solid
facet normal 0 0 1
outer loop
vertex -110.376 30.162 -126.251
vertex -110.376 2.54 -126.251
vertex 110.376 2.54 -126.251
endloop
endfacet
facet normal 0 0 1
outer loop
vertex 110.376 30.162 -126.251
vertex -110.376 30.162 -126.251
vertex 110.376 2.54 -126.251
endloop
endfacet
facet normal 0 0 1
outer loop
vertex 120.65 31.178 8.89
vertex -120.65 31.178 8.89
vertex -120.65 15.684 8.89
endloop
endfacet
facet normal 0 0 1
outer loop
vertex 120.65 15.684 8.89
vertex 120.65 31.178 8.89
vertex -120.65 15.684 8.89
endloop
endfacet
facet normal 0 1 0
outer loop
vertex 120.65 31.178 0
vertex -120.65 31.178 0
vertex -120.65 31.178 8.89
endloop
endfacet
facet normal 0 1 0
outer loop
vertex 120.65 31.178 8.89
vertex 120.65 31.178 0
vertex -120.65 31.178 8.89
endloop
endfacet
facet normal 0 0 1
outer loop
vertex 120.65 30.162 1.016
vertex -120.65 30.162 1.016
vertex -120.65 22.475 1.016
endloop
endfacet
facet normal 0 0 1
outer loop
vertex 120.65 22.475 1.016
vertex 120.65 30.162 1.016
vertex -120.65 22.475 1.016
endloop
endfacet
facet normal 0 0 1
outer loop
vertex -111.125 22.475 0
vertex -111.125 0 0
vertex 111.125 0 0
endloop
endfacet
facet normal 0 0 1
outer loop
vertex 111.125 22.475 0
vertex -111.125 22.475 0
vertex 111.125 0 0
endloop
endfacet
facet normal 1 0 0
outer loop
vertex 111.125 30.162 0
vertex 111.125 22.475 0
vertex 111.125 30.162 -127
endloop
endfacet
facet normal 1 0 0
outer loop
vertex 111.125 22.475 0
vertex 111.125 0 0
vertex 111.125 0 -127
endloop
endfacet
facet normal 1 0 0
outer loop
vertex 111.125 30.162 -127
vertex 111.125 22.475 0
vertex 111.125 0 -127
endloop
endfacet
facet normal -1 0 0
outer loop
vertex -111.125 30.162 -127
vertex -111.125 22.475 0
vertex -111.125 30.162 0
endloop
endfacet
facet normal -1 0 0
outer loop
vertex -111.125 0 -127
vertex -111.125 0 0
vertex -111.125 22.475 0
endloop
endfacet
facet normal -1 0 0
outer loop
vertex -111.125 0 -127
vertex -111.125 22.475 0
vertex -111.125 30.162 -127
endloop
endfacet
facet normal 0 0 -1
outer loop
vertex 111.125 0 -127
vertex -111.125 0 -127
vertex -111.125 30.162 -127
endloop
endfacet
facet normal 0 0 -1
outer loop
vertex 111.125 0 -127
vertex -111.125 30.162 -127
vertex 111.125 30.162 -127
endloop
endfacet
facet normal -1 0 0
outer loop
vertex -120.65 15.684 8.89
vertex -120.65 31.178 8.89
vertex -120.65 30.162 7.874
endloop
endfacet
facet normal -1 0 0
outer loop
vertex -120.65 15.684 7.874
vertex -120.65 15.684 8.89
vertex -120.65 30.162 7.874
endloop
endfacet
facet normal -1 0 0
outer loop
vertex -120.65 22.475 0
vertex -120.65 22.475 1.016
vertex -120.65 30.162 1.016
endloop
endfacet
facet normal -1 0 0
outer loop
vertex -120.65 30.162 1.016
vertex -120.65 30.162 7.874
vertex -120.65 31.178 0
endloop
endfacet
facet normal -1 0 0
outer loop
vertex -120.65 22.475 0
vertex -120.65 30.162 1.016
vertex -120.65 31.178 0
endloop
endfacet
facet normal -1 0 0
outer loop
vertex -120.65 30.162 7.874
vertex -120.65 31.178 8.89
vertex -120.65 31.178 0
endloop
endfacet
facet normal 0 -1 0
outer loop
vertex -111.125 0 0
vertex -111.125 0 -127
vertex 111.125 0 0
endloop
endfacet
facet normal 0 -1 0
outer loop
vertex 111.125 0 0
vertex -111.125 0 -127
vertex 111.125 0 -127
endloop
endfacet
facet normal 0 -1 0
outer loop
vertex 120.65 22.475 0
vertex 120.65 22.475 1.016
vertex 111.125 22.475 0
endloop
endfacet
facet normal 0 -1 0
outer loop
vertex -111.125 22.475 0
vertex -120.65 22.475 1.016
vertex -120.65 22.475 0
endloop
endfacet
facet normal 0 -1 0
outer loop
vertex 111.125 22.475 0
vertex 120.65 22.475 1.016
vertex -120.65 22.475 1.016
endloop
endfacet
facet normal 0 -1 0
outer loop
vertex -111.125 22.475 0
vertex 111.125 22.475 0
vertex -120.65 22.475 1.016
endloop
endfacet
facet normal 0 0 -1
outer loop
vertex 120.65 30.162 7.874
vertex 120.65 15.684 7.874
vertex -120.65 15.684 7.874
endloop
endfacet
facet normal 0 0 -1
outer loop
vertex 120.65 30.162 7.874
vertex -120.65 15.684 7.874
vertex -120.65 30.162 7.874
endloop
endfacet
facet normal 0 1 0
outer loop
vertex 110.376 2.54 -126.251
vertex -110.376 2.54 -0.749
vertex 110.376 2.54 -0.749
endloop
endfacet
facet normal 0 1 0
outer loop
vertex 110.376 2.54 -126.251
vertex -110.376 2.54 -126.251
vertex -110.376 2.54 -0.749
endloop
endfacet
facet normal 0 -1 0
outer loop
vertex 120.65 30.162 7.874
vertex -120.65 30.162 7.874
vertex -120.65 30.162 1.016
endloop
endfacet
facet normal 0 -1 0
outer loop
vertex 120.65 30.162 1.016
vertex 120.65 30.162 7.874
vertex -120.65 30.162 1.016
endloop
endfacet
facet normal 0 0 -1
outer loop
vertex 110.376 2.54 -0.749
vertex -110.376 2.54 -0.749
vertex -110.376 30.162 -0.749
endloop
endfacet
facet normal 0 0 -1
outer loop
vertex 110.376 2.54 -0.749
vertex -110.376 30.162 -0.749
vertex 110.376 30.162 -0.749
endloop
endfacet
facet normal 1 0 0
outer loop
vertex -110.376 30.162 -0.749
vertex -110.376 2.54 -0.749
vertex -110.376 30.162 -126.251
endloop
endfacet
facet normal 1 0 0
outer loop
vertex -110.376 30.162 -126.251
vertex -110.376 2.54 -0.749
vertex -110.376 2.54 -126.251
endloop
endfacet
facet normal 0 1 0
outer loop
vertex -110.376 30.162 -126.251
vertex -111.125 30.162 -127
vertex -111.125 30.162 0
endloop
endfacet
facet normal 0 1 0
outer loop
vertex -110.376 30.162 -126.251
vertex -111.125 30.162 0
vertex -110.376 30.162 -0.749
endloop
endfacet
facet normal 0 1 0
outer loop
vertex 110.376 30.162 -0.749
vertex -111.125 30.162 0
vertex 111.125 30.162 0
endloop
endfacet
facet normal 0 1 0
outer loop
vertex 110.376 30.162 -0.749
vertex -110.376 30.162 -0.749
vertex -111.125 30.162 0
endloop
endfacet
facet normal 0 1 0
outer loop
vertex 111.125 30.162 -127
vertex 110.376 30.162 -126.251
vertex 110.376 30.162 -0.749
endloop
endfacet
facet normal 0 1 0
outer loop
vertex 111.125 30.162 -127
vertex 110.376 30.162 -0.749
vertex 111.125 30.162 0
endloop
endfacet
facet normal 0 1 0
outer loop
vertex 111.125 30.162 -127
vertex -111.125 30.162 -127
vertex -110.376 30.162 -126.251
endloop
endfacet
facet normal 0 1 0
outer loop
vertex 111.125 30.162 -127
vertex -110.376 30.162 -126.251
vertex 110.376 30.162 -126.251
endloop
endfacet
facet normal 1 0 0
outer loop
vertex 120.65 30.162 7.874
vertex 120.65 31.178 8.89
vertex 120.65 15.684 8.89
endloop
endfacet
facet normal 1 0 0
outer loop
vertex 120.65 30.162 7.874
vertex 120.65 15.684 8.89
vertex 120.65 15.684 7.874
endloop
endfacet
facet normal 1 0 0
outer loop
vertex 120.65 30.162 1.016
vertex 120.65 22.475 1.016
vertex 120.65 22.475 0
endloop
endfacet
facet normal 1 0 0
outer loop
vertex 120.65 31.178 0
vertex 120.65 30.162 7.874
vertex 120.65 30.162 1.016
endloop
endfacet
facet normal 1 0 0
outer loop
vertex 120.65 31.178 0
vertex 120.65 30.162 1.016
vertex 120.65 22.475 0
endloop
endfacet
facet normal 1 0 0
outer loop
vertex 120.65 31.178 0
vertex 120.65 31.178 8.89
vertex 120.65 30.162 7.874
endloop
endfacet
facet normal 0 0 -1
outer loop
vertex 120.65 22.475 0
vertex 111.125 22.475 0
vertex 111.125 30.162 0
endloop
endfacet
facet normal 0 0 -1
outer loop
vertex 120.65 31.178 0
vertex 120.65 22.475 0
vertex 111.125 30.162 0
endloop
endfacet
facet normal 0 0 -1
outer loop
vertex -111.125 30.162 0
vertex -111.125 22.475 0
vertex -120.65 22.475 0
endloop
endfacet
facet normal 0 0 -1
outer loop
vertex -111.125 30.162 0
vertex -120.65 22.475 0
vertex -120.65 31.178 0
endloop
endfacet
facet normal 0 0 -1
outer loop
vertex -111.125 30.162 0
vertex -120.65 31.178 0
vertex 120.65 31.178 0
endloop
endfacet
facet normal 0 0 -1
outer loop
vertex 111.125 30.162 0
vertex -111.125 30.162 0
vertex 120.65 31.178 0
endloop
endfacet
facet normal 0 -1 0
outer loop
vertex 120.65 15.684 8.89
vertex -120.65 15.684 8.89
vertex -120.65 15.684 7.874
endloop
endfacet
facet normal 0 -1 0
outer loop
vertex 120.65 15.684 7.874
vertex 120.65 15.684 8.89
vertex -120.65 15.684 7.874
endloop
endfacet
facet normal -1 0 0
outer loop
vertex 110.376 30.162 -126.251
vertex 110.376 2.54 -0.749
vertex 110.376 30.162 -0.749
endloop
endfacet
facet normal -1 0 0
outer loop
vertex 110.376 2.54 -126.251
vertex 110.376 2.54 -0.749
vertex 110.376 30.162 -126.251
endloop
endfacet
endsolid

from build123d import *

# Parameters (mm, degrees)
SKETCH1_W         = 222.25
SKETCH1_H         = 127
BASE_DEPTH        = 2.54
SKETCH1_3_W       = 222.25
SKETCH1_3_H       = 127
SKETCH1_3_W_2     = 220.7514
SKETCH1_3_H_2     = 125.5014
WALLS_DEPTH       = 30.1625
HANDLE_DEPTH      = 120.65
HANDLE_DEPTH_BACK = 120.65


with BuildPart() as part:
    # Sketch1 → Base (new body)
    with BuildSketch(Plane(origin=(0, 0, 0), x_dir=(1, 0, 0), z_dir=(0, 1, 0))):
        with Locations((0, 63.5)):
            Rectangle(SKETCH1_W, SKETCH1_H)
    extrude(amount=BASE_DEPTH)

    # Sketch1<3> → Walls (add)
    with BuildSketch(Plane(origin=(0, 0, 0), x_dir=(1, 0, 0), z_dir=(0, 1, 0))):
        with Locations((0, 63.5)):
            Rectangle(SKETCH1_3_W, SKETCH1_3_H)
        with Locations((0, 63.5)):
            Rectangle(SKETCH1_3_W_2, SKETCH1_3_H_2, mode=Mode.SUBTRACT)
    extrude(amount=WALLS_DEPTH)

    # Sketch2 → Handle (add, two sides: drawn at the far end of the back side and taken through both)
    with BuildSketch(Plane(origin=(0, 0, 0), x_dir=(0, 0, -1), z_dir=(1, 0, 0)).offset(-HANDLE_DEPTH_BACK)):
        Polygon((0, 22.475414602), (0, 31.1785), (-8.89, 31.1785), (-8.89, 15.6845), (-7.874, 15.6845), (-7.874, 30.1625), (-1.016, 30.1625), (-1.016, 22.475414602), align=None)
    extrude(amount=HANDLE_DEPTH + HANDLE_DEPTH_BACK)


solid = part.part
